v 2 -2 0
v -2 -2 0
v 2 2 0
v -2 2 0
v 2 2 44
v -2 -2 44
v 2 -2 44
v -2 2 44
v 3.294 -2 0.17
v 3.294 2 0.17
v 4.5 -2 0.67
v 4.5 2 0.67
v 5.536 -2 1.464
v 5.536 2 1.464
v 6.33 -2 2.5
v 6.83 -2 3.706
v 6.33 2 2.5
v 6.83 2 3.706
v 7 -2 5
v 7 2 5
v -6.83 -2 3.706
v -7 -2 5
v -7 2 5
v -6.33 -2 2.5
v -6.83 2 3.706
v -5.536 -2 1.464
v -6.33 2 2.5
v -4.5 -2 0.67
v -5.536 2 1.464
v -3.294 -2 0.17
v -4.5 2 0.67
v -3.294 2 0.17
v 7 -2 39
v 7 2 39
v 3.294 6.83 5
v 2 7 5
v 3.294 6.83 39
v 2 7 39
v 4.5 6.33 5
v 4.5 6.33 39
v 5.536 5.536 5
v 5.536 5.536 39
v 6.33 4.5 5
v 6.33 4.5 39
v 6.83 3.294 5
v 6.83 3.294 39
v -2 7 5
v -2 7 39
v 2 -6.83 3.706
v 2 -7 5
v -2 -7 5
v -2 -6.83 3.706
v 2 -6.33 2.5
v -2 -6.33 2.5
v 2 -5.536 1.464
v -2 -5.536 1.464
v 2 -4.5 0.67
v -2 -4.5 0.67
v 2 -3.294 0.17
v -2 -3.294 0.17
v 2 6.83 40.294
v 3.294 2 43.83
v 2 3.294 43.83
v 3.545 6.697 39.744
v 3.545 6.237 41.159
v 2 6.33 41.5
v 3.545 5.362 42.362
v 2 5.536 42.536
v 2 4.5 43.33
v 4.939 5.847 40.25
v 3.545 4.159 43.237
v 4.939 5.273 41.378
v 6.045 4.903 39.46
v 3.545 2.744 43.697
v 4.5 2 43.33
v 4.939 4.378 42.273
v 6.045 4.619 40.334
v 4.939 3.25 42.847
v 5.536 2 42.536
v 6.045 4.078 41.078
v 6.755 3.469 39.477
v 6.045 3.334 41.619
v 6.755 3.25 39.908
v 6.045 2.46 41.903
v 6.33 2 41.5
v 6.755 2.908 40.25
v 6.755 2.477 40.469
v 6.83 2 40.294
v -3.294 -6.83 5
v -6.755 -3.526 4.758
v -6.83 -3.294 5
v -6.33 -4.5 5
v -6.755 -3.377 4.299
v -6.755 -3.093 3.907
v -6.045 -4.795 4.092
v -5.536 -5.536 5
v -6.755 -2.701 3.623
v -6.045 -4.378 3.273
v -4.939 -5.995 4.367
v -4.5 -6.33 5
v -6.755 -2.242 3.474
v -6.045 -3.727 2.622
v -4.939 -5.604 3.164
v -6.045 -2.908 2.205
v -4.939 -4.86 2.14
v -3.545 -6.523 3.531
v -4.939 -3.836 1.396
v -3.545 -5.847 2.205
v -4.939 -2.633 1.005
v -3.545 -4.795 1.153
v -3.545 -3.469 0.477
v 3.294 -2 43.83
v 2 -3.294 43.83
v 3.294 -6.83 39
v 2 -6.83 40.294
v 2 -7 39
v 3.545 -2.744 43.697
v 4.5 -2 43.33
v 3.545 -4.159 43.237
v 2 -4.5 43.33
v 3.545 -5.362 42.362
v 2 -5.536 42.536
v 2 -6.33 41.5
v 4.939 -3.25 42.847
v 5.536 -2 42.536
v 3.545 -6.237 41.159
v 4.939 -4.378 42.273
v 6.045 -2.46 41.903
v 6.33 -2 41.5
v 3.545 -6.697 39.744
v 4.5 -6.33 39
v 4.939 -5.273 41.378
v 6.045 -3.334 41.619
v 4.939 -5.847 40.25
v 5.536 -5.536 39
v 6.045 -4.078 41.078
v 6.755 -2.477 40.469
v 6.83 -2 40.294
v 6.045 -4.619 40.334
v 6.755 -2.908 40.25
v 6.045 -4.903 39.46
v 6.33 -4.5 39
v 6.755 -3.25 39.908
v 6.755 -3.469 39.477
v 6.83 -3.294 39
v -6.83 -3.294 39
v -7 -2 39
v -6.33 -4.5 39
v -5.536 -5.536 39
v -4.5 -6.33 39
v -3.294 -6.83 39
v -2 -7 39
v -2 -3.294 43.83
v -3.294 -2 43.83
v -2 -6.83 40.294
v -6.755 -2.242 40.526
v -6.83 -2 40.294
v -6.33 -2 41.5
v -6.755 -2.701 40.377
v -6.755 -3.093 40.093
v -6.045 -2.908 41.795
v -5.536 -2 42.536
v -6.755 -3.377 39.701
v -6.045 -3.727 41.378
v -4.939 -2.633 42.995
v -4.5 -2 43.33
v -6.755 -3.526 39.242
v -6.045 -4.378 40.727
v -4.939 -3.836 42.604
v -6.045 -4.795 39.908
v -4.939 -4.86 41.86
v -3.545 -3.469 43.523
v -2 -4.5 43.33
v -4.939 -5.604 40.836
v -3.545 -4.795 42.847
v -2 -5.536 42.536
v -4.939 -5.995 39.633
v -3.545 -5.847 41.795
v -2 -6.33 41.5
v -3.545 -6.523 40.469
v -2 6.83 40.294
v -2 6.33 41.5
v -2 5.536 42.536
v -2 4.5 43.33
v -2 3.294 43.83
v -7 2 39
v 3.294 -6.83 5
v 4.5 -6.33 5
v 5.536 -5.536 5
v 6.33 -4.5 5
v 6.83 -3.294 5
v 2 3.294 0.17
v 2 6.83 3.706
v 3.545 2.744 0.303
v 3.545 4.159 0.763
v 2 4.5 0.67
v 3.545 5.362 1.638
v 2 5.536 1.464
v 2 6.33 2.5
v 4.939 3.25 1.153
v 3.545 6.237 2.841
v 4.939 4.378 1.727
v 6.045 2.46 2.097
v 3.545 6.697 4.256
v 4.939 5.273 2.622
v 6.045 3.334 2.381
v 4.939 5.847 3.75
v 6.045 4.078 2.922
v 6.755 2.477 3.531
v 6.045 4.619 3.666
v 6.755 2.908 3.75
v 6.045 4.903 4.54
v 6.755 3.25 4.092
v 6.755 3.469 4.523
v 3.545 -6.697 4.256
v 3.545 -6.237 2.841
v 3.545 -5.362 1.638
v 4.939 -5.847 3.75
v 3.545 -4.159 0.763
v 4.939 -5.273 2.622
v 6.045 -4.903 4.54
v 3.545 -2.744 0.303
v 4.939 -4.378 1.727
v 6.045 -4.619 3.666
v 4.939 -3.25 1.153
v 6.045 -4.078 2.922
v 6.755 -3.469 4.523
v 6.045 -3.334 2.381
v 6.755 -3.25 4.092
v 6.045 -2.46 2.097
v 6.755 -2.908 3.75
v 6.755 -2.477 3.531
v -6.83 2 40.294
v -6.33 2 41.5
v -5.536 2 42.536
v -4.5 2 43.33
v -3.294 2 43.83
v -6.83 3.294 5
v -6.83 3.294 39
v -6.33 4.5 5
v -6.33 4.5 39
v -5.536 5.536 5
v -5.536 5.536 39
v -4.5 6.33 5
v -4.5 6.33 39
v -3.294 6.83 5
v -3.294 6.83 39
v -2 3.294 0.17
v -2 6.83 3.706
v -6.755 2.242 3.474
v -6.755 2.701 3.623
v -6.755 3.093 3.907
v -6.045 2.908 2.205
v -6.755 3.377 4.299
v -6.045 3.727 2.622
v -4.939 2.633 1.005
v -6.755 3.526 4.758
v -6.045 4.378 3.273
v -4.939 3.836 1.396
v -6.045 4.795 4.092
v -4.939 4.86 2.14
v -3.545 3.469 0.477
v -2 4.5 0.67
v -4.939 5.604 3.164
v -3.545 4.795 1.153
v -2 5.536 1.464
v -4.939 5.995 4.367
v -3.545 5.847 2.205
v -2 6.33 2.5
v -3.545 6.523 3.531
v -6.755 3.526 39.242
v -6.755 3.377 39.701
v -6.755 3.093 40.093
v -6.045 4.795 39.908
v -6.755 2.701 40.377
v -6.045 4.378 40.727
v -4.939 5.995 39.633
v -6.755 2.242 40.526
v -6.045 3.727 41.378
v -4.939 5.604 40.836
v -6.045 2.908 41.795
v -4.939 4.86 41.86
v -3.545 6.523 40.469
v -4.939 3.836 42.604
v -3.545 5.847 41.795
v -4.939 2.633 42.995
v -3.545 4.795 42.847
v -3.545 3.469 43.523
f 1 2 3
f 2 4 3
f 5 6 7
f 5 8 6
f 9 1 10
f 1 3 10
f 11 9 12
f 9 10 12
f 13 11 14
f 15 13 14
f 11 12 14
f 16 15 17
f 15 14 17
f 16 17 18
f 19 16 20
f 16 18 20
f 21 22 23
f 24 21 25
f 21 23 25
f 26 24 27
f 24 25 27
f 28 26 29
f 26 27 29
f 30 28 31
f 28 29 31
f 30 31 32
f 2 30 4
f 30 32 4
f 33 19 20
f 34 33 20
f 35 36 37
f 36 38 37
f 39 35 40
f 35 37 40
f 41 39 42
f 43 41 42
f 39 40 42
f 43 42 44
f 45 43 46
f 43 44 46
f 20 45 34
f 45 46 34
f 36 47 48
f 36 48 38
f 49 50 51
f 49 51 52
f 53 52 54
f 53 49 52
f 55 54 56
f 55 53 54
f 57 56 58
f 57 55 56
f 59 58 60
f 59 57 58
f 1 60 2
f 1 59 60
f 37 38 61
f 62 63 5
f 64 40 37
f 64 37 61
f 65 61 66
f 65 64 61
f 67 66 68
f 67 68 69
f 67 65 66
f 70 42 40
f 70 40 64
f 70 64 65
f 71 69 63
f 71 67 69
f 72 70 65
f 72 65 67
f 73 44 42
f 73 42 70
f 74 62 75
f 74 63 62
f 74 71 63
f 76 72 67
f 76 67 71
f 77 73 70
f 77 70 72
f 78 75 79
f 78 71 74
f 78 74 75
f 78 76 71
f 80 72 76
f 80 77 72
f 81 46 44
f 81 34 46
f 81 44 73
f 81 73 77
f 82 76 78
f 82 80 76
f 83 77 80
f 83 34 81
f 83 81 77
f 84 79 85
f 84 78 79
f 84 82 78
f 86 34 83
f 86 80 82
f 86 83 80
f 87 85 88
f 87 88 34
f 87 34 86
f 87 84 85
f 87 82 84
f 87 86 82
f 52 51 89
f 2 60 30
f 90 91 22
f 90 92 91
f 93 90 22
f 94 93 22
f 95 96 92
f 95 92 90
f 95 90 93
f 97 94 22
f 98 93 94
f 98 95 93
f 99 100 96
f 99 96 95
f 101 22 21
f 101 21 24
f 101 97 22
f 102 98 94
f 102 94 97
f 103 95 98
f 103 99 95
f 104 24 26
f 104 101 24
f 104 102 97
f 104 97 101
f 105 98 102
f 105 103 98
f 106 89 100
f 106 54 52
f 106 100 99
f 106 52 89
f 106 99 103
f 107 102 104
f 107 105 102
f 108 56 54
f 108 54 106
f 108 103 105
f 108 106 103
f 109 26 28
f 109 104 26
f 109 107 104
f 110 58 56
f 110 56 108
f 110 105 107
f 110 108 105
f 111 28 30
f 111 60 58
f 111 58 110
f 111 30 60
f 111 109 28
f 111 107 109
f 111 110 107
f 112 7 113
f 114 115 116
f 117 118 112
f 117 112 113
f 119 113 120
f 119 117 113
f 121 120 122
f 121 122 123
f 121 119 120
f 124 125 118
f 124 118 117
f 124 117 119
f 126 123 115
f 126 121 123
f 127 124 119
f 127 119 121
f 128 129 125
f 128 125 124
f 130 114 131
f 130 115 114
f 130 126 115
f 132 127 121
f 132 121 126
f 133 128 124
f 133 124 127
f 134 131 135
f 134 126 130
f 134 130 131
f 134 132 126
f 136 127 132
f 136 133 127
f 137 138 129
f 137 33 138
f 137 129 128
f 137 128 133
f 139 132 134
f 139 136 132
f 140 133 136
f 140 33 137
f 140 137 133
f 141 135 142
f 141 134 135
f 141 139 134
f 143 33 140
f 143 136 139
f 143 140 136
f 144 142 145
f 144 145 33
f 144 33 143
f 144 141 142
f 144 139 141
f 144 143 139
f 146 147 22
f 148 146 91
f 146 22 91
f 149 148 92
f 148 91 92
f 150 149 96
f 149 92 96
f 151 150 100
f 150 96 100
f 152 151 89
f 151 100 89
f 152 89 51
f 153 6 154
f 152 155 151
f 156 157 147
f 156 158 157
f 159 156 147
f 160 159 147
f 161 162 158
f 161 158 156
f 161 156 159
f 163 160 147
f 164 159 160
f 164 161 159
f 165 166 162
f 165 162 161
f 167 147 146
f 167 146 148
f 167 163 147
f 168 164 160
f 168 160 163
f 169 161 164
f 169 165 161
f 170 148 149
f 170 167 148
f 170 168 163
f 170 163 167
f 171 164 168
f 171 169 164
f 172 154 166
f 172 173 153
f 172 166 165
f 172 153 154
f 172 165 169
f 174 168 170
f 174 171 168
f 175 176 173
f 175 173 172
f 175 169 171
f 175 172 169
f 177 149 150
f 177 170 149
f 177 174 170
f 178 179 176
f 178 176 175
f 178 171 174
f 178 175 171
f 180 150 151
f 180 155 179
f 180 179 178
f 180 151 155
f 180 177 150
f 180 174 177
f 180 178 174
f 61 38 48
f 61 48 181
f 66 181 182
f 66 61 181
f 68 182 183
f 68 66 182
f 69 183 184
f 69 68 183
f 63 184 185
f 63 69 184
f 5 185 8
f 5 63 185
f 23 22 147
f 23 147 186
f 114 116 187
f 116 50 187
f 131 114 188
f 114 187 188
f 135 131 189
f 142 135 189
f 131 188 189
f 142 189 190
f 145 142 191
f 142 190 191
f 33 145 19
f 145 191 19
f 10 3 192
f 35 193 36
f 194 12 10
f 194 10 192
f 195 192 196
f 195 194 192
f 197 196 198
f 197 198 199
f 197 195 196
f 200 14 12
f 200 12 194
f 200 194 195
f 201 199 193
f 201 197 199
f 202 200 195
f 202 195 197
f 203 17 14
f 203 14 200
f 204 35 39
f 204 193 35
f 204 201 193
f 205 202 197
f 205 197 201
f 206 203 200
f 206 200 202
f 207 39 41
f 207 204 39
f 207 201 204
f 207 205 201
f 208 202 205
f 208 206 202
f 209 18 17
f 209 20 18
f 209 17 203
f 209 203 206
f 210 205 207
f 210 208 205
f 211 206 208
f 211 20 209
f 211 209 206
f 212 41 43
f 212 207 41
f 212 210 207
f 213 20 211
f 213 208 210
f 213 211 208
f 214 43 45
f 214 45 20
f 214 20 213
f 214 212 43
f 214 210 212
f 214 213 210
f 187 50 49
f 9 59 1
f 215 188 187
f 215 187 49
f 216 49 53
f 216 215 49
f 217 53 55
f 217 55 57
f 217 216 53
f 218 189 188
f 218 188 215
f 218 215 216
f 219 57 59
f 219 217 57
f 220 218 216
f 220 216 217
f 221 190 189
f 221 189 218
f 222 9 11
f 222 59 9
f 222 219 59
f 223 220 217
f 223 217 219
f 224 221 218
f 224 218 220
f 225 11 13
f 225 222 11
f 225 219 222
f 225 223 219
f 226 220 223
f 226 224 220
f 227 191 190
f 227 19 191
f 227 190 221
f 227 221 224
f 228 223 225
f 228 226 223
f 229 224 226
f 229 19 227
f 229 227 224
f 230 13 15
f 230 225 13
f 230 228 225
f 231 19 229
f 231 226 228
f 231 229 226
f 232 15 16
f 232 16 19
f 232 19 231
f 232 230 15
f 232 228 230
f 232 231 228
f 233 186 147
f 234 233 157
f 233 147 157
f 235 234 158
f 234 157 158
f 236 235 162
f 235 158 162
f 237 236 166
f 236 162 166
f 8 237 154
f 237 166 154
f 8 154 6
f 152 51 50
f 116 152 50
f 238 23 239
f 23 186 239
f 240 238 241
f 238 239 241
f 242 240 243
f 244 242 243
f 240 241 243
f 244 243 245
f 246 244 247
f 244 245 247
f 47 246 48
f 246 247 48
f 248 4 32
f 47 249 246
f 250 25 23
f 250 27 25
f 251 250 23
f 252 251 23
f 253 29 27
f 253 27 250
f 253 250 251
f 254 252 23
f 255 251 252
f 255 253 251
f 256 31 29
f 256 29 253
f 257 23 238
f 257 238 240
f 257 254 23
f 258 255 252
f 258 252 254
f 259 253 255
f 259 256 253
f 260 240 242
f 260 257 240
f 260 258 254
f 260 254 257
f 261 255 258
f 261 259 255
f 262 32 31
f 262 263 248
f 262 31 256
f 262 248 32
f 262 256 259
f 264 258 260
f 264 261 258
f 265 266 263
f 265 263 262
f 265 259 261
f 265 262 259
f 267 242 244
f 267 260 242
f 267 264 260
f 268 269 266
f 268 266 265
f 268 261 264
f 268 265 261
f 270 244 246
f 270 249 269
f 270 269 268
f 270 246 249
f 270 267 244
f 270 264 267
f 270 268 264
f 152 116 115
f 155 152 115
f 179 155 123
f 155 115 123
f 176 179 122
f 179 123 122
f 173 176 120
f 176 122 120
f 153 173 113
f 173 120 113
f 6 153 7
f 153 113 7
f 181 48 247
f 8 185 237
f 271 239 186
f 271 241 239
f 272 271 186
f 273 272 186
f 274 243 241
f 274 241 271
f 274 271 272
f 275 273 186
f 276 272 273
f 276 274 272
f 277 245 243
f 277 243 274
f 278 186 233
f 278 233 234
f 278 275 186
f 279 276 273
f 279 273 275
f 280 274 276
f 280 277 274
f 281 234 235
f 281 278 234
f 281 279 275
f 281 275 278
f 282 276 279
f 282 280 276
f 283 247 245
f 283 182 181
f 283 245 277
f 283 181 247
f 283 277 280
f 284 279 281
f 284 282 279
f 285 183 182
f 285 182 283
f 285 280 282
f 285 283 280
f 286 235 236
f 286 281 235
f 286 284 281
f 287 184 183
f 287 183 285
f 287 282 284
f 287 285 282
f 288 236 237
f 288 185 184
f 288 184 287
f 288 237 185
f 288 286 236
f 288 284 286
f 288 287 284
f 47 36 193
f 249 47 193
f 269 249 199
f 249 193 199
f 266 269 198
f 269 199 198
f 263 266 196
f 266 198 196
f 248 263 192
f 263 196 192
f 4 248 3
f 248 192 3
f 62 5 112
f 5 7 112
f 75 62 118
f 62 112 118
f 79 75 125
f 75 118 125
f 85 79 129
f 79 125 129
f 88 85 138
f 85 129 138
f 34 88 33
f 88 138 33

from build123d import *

# Parameters (mm, degrees)
F0_W     = 14
F0_H     = 14
F1_DEPTH = 44
F2_R     = 5
F3_R     = 5


with BuildPart() as f1:
    # F0 (on Top) → F1 (new body)
    with BuildSketch(Plane.XY):
        Rectangle(F0_W, F0_H)
    extrude(amount=F1_DEPTH)

    # F2
    f2_edges = [f1.edges().sort_by_distance(p)[0] for p in [
        (0, -7, 0),
        (0, 7, 0),
        (0, -7, 44),
        (0, 7, 44),
    ]]
    fillet(f2_edges, radius=F2_R)

    # F3
    f3_edges = [f1.edges().sort_by_distance(p)[0] for p in [
        (7, 7, 22),
        (0, 7, 5),
        (0, 7, 39),
        (-7, 7, 22),
    ]]
    fillet(f3_edges, radius=F3_R)


solid = f1.part
